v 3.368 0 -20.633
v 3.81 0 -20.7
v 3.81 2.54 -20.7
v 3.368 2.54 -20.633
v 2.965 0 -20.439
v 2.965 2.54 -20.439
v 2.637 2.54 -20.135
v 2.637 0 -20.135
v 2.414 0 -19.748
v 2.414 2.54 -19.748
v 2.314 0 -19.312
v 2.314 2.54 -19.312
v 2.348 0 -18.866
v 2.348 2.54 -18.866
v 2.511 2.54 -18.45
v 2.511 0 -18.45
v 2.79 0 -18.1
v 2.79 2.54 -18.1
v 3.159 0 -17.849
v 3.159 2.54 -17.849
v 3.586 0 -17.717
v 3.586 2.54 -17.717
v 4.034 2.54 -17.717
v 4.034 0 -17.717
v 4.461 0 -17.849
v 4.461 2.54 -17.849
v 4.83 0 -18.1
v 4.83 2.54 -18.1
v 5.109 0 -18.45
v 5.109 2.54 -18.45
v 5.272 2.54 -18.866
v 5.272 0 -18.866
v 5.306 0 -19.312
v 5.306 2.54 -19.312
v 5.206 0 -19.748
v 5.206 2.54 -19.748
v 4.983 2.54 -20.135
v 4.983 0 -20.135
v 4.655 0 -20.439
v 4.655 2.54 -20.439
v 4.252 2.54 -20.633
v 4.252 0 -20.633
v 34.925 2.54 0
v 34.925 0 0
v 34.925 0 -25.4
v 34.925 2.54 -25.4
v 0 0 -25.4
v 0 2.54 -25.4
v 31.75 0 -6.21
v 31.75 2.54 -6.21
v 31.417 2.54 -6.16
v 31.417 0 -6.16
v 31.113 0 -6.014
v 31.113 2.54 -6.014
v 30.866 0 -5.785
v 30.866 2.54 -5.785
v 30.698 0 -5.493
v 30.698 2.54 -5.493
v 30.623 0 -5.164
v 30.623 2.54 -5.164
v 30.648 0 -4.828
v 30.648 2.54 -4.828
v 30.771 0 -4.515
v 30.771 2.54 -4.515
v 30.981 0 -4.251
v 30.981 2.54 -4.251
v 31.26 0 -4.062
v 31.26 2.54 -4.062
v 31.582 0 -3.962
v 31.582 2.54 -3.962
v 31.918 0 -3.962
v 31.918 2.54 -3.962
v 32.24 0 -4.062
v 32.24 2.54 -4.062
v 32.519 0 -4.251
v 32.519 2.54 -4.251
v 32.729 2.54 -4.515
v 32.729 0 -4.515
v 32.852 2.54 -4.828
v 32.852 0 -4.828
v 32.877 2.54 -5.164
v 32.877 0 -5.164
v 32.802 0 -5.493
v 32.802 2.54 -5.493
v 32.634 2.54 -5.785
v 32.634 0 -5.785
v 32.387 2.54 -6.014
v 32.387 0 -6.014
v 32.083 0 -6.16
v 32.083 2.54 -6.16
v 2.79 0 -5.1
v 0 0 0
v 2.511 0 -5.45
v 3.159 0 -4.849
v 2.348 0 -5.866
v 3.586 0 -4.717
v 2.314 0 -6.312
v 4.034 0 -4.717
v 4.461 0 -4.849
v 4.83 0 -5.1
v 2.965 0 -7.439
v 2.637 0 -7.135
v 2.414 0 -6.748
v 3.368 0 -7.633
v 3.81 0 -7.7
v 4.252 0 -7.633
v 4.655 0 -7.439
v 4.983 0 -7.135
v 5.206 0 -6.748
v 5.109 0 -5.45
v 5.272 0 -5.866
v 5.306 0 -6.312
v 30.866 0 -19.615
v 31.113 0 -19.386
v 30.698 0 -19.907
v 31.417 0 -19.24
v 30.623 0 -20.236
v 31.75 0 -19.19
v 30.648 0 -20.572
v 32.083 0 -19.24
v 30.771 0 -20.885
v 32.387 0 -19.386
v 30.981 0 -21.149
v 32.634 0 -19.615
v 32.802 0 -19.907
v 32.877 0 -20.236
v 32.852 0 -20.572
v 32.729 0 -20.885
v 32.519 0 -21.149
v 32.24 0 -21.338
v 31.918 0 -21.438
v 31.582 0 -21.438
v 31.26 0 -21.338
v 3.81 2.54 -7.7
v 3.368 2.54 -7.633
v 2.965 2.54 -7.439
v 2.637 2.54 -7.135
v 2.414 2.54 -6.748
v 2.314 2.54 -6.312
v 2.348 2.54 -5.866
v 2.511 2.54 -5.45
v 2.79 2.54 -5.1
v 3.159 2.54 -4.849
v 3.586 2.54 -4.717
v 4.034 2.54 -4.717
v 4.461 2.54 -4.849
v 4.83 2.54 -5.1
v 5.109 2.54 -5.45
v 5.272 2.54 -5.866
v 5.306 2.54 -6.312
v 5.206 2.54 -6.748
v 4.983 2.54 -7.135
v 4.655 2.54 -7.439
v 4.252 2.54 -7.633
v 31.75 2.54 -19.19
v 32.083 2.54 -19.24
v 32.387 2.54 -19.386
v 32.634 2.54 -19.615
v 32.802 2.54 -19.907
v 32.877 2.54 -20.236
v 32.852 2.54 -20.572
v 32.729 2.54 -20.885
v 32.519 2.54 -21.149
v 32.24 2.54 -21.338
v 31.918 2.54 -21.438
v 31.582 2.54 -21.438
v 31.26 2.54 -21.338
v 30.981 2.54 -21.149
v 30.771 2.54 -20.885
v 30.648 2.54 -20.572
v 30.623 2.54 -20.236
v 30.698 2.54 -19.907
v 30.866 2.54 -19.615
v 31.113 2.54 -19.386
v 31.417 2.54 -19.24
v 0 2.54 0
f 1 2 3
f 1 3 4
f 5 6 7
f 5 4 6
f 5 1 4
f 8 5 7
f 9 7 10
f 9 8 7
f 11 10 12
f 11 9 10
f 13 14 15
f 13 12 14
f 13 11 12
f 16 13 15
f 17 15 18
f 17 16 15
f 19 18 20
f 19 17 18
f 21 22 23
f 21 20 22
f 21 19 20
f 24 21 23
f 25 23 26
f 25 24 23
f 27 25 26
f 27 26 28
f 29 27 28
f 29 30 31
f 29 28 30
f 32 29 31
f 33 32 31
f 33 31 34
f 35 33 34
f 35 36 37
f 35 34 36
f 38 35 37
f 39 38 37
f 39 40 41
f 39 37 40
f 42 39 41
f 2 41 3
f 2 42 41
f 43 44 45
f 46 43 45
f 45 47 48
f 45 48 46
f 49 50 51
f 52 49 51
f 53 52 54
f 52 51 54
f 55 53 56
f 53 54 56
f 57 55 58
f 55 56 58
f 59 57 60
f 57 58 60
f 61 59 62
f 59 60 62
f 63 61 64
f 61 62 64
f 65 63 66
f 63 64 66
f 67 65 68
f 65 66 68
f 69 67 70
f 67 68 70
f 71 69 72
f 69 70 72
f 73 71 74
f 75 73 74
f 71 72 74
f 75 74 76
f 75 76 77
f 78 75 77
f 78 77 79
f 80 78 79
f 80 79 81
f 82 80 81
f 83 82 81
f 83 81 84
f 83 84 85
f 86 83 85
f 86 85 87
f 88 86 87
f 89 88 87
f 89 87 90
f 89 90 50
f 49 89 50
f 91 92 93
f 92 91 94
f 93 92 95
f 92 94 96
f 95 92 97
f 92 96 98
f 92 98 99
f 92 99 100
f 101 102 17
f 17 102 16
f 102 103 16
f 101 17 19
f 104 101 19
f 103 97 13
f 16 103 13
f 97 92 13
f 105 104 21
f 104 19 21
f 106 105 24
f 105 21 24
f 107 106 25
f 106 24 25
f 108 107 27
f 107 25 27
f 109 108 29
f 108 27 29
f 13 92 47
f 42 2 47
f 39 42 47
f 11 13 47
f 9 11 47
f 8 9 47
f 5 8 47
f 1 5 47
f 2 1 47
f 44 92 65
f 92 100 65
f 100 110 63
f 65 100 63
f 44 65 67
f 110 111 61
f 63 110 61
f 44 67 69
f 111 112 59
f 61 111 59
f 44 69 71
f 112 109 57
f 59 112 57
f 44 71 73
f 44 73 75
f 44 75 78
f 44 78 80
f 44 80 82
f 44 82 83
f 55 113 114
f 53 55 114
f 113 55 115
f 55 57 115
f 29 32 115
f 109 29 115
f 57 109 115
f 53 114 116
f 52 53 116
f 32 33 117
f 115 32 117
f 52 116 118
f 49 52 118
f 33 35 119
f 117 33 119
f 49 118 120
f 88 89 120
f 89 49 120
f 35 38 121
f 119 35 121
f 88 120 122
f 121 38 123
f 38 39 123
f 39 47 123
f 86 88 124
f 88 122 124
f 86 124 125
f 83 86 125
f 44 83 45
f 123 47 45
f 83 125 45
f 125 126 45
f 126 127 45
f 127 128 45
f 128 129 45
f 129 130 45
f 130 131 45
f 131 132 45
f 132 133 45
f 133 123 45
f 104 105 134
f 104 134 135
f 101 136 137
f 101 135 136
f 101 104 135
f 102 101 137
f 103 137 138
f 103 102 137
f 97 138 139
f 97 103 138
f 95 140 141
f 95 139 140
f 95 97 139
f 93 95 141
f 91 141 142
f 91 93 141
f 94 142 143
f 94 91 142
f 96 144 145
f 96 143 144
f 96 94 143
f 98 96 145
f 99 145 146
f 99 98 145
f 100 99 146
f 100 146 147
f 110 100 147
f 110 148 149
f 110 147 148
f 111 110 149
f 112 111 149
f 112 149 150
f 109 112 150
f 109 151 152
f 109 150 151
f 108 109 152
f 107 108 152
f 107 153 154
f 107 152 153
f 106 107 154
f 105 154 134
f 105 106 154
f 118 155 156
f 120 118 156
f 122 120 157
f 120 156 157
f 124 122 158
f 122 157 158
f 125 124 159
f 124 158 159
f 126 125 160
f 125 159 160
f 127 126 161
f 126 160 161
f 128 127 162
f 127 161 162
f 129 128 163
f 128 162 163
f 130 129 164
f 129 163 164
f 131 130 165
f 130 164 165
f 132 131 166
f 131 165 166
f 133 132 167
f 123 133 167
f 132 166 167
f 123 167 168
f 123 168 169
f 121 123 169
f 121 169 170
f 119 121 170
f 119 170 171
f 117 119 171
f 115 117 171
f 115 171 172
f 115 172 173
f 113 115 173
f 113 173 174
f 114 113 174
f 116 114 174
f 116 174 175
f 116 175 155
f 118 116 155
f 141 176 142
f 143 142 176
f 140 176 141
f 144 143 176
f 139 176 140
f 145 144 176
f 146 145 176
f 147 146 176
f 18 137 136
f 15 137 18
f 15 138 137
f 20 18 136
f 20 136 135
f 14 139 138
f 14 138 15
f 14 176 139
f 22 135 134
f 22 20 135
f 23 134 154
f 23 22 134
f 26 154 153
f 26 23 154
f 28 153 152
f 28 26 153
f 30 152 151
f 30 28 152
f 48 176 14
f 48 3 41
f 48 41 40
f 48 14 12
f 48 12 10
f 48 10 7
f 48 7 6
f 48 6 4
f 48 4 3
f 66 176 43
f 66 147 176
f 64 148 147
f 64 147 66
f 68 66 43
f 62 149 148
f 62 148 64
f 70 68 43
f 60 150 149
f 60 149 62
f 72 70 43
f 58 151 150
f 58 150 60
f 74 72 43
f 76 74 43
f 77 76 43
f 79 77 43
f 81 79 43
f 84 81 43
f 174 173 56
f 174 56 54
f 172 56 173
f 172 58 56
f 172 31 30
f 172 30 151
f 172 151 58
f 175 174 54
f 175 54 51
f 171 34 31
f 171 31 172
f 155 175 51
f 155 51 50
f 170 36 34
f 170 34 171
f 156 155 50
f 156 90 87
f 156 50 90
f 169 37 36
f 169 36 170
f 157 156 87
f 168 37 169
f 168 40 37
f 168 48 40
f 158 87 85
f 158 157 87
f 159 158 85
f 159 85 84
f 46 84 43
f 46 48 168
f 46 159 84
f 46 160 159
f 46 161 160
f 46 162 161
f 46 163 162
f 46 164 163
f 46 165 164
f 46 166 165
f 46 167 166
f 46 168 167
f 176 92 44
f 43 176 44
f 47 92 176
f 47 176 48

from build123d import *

# Parameters (mm, degrees)
SKETCH1_W               = 34.925
SKETCH1_H               = 25.4
BOSS_EXTRUDE1_DEPTH     = 2.54
CUT_EXTRUDE3_DEPTH      = 44.259302179
CUT_EXTRUDE3_DEPTH_BACK = 44.259302179
SKETCH2_R               = 1.5
SKETCH5_R               = 1.1303
CUT_EXTRUDE4_DEPTH      = 44.259302179


with BuildPart() as part:
    # Sketch1 → Boss-Extrude1 (new body)
    with BuildSketch(Plane(origin=(0, 0, 0), x_dir=(1, 0, 0), z_dir=(0, 1, 0))):
        with Locations((17.4625, 12.7)):
            Rectangle(SKETCH1_W, SKETCH1_H)
    extrude(amount=BOSS_EXTRUDE1_DEPTH)

    # Sketch2 → Cut-Extrude3 (cut, two sides: drawn at the far end of the back side and taken through both)
    with BuildSketch(Plane(origin=(0, 2.54, 0), x_dir=(1, 0, 0), z_dir=(0, 1, 0)).offset(-CUT_EXTRUDE3_DEPTH_BACK)):
        with Locations(Location((3.81, 19.2, 0), (0, 0, 90))):
            Circle(SKETCH2_R)
        with Locations(Location((3.81, 6.2, 0), (0, 0, 90))):
            Circle(SKETCH2_R)
    extrude(amount=CUT_EXTRUDE3_DEPTH + CUT_EXTRUDE3_DEPTH_BACK, mode=Mode.SUBTRACT)

    # Sketch5 → Cut-Extrude4 (cut, through all)
    with BuildSketch(Plane(origin=(0, 2.54, 0), x_dir=(1, 0, 0), z_dir=(0, 1, 0))):
        with Locations(Location((31.75, 20.32, 0), (0, 0, 270))):
            Circle(SKETCH5_R)
        with Locations(Location((31.75, 5.08, 0), (0, 0, 90))):
            Circle(SKETCH5_R)
    extrude(amount=-CUT_EXTRUDE4_DEPTH, mode=Mode.SUBTRACT)


solid = part.part
